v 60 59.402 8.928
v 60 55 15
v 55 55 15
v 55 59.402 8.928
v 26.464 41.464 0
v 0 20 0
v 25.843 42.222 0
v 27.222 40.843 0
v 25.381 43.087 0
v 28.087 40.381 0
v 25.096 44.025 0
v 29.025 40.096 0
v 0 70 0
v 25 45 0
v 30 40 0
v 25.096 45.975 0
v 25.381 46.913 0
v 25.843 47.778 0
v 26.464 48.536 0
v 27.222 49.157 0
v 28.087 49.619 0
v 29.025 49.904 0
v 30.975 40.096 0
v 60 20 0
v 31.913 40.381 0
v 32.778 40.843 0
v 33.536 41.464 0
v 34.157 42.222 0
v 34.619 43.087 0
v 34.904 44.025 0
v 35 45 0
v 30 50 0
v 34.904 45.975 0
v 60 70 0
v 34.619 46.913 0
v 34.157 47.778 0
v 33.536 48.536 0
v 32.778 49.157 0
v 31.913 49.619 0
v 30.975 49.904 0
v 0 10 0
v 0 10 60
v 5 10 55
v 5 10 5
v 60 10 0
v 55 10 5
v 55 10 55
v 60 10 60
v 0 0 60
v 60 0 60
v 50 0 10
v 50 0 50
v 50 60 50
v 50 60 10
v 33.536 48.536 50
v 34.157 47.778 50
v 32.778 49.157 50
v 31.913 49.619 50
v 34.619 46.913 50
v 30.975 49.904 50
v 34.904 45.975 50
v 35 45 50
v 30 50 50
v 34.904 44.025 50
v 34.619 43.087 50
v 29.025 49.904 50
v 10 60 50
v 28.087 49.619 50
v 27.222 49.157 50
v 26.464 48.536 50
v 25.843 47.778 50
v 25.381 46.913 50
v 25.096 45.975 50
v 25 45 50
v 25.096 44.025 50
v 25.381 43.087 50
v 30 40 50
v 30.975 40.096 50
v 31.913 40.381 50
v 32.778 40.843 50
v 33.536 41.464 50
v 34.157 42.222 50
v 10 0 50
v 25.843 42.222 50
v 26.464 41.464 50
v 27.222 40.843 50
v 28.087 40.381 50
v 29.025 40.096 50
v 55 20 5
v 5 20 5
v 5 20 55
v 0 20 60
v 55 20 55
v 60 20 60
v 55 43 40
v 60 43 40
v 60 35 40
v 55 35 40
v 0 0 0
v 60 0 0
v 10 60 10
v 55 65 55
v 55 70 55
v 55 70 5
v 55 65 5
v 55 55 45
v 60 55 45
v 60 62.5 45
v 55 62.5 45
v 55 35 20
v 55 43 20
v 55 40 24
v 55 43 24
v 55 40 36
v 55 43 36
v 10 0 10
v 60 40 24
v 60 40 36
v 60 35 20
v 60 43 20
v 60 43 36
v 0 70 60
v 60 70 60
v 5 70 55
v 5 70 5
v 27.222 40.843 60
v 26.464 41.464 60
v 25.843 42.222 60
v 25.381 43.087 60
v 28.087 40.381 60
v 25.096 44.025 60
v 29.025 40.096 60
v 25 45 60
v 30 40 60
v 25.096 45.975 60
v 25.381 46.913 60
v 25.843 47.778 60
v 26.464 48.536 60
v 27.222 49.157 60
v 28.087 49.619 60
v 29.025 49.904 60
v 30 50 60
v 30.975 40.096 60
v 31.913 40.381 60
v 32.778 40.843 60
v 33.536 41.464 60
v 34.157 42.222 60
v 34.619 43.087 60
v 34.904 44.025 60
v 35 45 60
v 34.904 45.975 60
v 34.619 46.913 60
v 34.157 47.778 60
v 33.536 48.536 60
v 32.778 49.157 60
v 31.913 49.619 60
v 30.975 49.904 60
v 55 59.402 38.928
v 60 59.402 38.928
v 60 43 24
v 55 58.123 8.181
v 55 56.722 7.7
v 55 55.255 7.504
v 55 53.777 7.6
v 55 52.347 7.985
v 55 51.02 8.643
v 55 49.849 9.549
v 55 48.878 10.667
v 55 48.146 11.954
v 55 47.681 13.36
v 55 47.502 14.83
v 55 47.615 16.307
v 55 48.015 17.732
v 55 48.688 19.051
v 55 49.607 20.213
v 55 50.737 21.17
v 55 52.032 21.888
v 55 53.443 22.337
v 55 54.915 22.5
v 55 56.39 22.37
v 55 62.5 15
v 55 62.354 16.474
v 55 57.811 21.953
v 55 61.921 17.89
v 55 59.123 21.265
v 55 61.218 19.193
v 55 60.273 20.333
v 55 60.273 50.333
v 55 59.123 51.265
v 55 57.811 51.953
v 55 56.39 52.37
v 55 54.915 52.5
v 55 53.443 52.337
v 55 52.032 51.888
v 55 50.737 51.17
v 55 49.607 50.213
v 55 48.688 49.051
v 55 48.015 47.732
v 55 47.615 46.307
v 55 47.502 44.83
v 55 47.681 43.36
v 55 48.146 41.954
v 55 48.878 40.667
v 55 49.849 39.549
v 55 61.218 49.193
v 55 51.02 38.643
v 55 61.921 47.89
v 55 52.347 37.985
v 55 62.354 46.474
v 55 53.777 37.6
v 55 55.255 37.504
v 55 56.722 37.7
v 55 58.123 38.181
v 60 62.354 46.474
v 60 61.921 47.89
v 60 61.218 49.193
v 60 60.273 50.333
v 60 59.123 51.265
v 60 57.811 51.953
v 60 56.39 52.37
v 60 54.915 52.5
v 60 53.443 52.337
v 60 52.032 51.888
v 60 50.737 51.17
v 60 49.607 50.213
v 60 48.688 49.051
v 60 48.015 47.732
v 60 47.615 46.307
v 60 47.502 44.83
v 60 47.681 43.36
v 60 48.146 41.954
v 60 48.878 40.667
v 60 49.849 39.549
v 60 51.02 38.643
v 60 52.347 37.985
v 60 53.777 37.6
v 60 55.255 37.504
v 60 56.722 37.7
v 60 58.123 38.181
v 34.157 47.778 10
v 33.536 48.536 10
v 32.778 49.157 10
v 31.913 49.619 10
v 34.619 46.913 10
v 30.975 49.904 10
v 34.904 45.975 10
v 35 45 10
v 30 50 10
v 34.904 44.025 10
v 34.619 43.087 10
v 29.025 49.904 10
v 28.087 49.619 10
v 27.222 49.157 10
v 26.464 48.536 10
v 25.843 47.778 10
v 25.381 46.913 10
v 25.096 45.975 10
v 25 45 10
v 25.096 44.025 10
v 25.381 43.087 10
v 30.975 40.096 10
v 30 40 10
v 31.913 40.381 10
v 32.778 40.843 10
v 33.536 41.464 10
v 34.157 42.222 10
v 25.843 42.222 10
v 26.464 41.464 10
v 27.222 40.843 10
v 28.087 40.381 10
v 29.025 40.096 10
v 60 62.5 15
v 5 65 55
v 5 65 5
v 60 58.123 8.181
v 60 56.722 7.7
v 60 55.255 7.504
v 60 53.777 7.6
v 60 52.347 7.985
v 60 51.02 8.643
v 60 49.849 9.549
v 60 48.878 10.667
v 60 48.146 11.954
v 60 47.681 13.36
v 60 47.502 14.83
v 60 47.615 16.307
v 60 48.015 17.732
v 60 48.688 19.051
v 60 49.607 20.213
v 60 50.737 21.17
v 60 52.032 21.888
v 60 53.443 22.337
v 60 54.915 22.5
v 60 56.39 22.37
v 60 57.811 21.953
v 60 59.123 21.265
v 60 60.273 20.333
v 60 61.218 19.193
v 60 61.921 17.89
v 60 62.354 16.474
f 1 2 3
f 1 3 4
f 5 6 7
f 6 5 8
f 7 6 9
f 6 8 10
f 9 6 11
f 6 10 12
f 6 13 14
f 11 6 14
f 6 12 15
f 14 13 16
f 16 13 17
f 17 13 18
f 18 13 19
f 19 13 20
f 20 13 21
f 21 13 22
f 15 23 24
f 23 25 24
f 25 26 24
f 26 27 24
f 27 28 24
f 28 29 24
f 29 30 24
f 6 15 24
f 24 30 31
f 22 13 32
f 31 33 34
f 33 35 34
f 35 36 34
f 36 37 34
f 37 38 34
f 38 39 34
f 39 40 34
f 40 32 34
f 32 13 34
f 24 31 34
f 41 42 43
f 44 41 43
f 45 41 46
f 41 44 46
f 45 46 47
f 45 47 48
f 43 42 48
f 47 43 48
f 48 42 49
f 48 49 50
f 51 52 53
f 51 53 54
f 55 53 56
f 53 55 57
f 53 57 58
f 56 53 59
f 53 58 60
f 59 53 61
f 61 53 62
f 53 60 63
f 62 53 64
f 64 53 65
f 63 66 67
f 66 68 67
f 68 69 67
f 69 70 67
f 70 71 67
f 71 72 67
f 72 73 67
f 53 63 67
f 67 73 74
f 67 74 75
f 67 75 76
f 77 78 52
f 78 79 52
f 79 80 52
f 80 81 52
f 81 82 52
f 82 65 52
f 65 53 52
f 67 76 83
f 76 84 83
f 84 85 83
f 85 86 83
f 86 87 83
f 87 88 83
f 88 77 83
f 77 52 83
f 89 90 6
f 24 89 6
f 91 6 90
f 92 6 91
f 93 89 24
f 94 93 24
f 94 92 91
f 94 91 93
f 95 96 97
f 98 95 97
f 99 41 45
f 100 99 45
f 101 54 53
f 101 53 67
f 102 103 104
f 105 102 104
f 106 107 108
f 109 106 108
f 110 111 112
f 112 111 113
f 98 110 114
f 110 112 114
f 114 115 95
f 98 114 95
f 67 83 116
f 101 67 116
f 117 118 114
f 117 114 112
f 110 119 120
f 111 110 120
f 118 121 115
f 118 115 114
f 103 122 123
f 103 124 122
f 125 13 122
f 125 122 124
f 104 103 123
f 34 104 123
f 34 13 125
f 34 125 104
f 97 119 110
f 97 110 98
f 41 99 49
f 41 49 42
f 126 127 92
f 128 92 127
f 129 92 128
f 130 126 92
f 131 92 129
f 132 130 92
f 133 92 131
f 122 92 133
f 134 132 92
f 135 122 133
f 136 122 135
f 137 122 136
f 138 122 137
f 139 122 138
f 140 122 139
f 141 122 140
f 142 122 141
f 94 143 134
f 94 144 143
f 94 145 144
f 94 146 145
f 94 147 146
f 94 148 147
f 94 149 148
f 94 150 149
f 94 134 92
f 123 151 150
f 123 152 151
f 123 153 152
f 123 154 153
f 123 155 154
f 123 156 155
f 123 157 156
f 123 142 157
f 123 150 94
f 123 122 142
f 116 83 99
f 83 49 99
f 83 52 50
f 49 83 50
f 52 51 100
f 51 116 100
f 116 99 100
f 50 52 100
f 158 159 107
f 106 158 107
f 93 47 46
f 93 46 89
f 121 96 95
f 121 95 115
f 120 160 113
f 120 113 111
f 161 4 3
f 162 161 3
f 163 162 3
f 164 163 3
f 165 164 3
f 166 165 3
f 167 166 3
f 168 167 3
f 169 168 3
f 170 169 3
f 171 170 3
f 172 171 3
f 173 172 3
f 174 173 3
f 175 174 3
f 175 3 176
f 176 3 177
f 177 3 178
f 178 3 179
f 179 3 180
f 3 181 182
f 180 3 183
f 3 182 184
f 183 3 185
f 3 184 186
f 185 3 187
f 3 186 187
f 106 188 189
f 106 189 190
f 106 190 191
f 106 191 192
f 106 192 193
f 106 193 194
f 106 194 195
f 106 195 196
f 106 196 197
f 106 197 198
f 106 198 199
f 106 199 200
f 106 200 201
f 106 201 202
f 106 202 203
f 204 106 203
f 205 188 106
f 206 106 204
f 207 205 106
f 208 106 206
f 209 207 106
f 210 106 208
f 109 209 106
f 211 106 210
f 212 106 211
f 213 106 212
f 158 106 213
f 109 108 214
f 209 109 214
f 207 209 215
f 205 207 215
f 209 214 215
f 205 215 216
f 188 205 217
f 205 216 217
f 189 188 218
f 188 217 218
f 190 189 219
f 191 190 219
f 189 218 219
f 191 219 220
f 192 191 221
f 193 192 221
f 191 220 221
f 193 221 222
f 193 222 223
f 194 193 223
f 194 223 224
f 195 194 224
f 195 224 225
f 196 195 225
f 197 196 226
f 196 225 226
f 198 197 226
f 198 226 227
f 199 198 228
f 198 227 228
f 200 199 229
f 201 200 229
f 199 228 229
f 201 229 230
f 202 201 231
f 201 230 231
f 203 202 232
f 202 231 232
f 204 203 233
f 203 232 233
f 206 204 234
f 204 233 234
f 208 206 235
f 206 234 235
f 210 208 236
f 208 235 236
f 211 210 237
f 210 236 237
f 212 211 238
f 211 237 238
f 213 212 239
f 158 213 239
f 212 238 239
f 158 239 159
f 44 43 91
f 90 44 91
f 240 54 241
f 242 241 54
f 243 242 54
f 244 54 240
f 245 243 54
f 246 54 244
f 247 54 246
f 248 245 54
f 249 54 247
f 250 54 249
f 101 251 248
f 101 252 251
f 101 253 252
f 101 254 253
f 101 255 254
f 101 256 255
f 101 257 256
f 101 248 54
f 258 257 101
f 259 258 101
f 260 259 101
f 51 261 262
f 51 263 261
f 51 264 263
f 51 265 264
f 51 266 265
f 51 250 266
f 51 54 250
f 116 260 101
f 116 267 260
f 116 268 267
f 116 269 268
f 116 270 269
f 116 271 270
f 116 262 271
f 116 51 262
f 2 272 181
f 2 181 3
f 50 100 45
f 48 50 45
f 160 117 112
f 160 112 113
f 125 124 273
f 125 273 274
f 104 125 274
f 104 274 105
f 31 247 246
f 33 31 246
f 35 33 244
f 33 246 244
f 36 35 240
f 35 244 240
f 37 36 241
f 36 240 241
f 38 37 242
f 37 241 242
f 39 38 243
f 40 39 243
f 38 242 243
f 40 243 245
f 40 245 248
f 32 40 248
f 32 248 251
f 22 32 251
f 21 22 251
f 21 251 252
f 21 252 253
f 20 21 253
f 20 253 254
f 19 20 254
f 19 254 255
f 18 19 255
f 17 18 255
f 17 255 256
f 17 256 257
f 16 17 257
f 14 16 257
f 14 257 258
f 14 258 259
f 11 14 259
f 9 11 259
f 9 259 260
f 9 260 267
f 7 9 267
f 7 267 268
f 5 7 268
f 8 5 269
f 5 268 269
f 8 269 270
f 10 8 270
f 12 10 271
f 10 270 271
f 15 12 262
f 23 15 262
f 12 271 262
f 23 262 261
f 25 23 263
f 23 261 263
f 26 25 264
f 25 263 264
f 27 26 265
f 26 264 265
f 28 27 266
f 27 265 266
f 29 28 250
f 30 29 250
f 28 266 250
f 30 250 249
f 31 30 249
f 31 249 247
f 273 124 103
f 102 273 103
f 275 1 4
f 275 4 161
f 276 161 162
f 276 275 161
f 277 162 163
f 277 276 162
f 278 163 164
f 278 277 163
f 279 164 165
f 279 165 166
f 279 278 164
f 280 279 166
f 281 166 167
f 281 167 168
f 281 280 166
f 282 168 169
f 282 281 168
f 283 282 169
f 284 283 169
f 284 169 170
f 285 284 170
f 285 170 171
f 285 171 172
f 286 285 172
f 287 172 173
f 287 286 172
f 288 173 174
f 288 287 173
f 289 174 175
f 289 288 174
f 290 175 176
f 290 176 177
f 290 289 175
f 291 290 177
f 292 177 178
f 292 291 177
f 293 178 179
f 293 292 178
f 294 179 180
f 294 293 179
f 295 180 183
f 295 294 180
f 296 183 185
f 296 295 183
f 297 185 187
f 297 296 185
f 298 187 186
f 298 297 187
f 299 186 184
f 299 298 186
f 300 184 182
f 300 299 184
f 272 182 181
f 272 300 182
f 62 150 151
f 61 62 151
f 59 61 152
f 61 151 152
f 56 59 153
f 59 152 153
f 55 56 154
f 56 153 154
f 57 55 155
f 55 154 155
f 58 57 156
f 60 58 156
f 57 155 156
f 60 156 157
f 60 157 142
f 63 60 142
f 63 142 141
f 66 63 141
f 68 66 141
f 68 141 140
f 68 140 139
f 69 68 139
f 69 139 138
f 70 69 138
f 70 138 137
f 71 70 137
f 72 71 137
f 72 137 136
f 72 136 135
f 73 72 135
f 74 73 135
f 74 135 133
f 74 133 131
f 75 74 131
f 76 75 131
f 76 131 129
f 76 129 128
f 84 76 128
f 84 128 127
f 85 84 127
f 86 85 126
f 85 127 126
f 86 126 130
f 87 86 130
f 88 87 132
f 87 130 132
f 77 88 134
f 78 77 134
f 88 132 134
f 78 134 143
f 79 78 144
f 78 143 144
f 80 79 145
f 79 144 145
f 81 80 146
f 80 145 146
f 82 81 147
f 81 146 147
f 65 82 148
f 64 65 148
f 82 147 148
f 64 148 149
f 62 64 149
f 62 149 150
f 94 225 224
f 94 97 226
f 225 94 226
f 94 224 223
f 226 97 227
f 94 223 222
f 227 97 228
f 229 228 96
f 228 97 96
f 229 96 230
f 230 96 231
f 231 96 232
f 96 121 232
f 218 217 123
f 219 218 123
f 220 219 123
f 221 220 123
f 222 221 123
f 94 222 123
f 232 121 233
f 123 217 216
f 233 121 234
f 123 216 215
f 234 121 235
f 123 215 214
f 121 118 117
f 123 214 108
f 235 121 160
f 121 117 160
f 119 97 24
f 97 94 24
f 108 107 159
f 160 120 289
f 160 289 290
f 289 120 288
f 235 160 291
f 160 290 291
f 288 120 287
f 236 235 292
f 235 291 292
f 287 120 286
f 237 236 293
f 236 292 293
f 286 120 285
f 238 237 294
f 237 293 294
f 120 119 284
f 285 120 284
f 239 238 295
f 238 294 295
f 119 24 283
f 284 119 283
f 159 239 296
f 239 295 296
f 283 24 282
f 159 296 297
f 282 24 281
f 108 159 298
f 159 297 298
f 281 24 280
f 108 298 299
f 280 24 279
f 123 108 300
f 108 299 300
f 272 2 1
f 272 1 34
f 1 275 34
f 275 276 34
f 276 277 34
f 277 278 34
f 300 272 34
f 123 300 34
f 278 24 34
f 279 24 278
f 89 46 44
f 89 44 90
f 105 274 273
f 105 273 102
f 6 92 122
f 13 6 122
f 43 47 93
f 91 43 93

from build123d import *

# Parameters (mm, degrees)
SKETCH1_W           = 60
SKETCH1_H           = 70
BOSS_EXTRUDE3_DEPTH = 60
SKETCH2_W           = 50
SKETCH2_H           = 50
CUT_EXTRUDE1_DEPTH  = 5
SKETCH3_W           = 5
SKETCH3_H           = 10
CUT_EXTRUDE3_DEPTH  = 111
SKETCH6_W           = 5
SKETCH6_H           = 10
CUT_EXTRUDE4_DEPTH  = 111
CUT_EXTRUDE5_DEPTH  = 5
CUT_EXTRUDE7_DEPTH  = 5
SKETCH9_W           = 40
SKETCH9_H           = 40
CUT_EXTRUDE8_DEPTH  = 60
SKETCH10_R          = 5
CUT_EXTRUDE9_DEPTH  = 111


with BuildPart() as part:
    # Sketch1 → Boss-Extrude3 (new body)
    with BuildSketch(Plane.XY):
        with Locations((30, 35)):
            Rectangle(SKETCH1_W, SKETCH1_H)
    extrude(amount=BOSS_EXTRUDE3_DEPTH)

    # Sketch2 → Cut-Extrude1 (cut)
    with BuildSketch(Plane(origin=(0, 70, 0), x_dir=(1, 0, 0), z_dir=(0, 1, 0))):
        with Locations((30, -30)):
            Rectangle(SKETCH2_W, SKETCH2_H)
    extrude(amount=-CUT_EXTRUDE1_DEPTH, mode=Mode.SUBTRACT)

    # Sketch3 → Cut-Extrude3 (cut, through all)
    with BuildSketch(Plane.XY.offset(60)):
        with Locations((2.5, 15)):
            Rectangle(SKETCH3_W, SKETCH3_H)
        with Locations((57.5, 15)):
            Rectangle(SKETCH3_W, SKETCH3_H)
    extrude(amount=-CUT_EXTRUDE3_DEPTH, mode=Mode.SUBTRACT)

    # Sketch6 → Cut-Extrude4 (cut, through all)
    with BuildSketch(Plane(origin=(60, 0, 0), x_dir=(0, 0, -1), z_dir=(1, 0, 0))):
        with Locations((-57.5, 15)):
            Rectangle(SKETCH6_W, SKETCH6_H)
        with Locations((-2.5, 15)):
            Rectangle(SKETCH6_W, SKETCH6_H)
    extrude(amount=-CUT_EXTRUDE4_DEPTH, mode=Mode.SUBTRACT)

    # Sketch7 → Cut-Extrude5 (cut)
    with BuildSketch(Plane(origin=(60, 0, 0), x_dir=(0, 0, -1), z_dir=(1, 0, 0))):
        Polygon((-36, 40), (-24, 40), (-24, 43), (-20, 43), (-20, 40), (-20, 35), (-40, 35), (-40, 40), (-40, 43), (-36, 43), align=None)
    extrude(amount=-CUT_EXTRUDE5_DEPTH, mode=Mode.SUBTRACT)

    # Sketch8 → Cut-Extrude7 (cut)
    with BuildSketch(Plane(origin=(60, 0, 0), x_dir=(0, 0, -1), z_dir=(1, 0, 0))):
        with BuildLine():
            Line((-45, 55), (-45, 62.5))
            ThreePointArc((-45, 62.5), (-48.408526169, 48.319285266), (-38.927629067, 59.401853162))
            Line((-38.927629067, 59.401853162), (-45, 55))
        make_face()
        with BuildLine():
            Line((-15, 55), (-8.927629067, 59.401853162))
            ThreePointArc((-8.927629067, 59.401853162), (-18.408526169, 48.319285266), (-15, 62.5))
            Line((-15, 62.5), (-15, 55))
        make_face()
    extrude(amount=-CUT_EXTRUDE7_DEPTH, mode=Mode.SUBTRACT)

    # Sketch9 → Cut-Extrude8 (cut)
    with BuildSketch(Plane(origin=(0, 0, 0), x_dir=(-1, 0, 0), z_dir=(0, -1, 0))):
        with Locations((-30, -30)):
            Rectangle(SKETCH9_W, SKETCH9_H)
    extrude(amount=-CUT_EXTRUDE8_DEPTH, mode=Mode.SUBTRACT)

    # Sketch10 → Cut-Extrude9 (cut, through all)
    with BuildSketch(Plane.XY.offset(60)):
        with Locations((30, 45)):
            Circle(SKETCH10_R)
    extrude(amount=-CUT_EXTRUDE9_DEPTH, mode=Mode.SUBTRACT)


solid = part.part
